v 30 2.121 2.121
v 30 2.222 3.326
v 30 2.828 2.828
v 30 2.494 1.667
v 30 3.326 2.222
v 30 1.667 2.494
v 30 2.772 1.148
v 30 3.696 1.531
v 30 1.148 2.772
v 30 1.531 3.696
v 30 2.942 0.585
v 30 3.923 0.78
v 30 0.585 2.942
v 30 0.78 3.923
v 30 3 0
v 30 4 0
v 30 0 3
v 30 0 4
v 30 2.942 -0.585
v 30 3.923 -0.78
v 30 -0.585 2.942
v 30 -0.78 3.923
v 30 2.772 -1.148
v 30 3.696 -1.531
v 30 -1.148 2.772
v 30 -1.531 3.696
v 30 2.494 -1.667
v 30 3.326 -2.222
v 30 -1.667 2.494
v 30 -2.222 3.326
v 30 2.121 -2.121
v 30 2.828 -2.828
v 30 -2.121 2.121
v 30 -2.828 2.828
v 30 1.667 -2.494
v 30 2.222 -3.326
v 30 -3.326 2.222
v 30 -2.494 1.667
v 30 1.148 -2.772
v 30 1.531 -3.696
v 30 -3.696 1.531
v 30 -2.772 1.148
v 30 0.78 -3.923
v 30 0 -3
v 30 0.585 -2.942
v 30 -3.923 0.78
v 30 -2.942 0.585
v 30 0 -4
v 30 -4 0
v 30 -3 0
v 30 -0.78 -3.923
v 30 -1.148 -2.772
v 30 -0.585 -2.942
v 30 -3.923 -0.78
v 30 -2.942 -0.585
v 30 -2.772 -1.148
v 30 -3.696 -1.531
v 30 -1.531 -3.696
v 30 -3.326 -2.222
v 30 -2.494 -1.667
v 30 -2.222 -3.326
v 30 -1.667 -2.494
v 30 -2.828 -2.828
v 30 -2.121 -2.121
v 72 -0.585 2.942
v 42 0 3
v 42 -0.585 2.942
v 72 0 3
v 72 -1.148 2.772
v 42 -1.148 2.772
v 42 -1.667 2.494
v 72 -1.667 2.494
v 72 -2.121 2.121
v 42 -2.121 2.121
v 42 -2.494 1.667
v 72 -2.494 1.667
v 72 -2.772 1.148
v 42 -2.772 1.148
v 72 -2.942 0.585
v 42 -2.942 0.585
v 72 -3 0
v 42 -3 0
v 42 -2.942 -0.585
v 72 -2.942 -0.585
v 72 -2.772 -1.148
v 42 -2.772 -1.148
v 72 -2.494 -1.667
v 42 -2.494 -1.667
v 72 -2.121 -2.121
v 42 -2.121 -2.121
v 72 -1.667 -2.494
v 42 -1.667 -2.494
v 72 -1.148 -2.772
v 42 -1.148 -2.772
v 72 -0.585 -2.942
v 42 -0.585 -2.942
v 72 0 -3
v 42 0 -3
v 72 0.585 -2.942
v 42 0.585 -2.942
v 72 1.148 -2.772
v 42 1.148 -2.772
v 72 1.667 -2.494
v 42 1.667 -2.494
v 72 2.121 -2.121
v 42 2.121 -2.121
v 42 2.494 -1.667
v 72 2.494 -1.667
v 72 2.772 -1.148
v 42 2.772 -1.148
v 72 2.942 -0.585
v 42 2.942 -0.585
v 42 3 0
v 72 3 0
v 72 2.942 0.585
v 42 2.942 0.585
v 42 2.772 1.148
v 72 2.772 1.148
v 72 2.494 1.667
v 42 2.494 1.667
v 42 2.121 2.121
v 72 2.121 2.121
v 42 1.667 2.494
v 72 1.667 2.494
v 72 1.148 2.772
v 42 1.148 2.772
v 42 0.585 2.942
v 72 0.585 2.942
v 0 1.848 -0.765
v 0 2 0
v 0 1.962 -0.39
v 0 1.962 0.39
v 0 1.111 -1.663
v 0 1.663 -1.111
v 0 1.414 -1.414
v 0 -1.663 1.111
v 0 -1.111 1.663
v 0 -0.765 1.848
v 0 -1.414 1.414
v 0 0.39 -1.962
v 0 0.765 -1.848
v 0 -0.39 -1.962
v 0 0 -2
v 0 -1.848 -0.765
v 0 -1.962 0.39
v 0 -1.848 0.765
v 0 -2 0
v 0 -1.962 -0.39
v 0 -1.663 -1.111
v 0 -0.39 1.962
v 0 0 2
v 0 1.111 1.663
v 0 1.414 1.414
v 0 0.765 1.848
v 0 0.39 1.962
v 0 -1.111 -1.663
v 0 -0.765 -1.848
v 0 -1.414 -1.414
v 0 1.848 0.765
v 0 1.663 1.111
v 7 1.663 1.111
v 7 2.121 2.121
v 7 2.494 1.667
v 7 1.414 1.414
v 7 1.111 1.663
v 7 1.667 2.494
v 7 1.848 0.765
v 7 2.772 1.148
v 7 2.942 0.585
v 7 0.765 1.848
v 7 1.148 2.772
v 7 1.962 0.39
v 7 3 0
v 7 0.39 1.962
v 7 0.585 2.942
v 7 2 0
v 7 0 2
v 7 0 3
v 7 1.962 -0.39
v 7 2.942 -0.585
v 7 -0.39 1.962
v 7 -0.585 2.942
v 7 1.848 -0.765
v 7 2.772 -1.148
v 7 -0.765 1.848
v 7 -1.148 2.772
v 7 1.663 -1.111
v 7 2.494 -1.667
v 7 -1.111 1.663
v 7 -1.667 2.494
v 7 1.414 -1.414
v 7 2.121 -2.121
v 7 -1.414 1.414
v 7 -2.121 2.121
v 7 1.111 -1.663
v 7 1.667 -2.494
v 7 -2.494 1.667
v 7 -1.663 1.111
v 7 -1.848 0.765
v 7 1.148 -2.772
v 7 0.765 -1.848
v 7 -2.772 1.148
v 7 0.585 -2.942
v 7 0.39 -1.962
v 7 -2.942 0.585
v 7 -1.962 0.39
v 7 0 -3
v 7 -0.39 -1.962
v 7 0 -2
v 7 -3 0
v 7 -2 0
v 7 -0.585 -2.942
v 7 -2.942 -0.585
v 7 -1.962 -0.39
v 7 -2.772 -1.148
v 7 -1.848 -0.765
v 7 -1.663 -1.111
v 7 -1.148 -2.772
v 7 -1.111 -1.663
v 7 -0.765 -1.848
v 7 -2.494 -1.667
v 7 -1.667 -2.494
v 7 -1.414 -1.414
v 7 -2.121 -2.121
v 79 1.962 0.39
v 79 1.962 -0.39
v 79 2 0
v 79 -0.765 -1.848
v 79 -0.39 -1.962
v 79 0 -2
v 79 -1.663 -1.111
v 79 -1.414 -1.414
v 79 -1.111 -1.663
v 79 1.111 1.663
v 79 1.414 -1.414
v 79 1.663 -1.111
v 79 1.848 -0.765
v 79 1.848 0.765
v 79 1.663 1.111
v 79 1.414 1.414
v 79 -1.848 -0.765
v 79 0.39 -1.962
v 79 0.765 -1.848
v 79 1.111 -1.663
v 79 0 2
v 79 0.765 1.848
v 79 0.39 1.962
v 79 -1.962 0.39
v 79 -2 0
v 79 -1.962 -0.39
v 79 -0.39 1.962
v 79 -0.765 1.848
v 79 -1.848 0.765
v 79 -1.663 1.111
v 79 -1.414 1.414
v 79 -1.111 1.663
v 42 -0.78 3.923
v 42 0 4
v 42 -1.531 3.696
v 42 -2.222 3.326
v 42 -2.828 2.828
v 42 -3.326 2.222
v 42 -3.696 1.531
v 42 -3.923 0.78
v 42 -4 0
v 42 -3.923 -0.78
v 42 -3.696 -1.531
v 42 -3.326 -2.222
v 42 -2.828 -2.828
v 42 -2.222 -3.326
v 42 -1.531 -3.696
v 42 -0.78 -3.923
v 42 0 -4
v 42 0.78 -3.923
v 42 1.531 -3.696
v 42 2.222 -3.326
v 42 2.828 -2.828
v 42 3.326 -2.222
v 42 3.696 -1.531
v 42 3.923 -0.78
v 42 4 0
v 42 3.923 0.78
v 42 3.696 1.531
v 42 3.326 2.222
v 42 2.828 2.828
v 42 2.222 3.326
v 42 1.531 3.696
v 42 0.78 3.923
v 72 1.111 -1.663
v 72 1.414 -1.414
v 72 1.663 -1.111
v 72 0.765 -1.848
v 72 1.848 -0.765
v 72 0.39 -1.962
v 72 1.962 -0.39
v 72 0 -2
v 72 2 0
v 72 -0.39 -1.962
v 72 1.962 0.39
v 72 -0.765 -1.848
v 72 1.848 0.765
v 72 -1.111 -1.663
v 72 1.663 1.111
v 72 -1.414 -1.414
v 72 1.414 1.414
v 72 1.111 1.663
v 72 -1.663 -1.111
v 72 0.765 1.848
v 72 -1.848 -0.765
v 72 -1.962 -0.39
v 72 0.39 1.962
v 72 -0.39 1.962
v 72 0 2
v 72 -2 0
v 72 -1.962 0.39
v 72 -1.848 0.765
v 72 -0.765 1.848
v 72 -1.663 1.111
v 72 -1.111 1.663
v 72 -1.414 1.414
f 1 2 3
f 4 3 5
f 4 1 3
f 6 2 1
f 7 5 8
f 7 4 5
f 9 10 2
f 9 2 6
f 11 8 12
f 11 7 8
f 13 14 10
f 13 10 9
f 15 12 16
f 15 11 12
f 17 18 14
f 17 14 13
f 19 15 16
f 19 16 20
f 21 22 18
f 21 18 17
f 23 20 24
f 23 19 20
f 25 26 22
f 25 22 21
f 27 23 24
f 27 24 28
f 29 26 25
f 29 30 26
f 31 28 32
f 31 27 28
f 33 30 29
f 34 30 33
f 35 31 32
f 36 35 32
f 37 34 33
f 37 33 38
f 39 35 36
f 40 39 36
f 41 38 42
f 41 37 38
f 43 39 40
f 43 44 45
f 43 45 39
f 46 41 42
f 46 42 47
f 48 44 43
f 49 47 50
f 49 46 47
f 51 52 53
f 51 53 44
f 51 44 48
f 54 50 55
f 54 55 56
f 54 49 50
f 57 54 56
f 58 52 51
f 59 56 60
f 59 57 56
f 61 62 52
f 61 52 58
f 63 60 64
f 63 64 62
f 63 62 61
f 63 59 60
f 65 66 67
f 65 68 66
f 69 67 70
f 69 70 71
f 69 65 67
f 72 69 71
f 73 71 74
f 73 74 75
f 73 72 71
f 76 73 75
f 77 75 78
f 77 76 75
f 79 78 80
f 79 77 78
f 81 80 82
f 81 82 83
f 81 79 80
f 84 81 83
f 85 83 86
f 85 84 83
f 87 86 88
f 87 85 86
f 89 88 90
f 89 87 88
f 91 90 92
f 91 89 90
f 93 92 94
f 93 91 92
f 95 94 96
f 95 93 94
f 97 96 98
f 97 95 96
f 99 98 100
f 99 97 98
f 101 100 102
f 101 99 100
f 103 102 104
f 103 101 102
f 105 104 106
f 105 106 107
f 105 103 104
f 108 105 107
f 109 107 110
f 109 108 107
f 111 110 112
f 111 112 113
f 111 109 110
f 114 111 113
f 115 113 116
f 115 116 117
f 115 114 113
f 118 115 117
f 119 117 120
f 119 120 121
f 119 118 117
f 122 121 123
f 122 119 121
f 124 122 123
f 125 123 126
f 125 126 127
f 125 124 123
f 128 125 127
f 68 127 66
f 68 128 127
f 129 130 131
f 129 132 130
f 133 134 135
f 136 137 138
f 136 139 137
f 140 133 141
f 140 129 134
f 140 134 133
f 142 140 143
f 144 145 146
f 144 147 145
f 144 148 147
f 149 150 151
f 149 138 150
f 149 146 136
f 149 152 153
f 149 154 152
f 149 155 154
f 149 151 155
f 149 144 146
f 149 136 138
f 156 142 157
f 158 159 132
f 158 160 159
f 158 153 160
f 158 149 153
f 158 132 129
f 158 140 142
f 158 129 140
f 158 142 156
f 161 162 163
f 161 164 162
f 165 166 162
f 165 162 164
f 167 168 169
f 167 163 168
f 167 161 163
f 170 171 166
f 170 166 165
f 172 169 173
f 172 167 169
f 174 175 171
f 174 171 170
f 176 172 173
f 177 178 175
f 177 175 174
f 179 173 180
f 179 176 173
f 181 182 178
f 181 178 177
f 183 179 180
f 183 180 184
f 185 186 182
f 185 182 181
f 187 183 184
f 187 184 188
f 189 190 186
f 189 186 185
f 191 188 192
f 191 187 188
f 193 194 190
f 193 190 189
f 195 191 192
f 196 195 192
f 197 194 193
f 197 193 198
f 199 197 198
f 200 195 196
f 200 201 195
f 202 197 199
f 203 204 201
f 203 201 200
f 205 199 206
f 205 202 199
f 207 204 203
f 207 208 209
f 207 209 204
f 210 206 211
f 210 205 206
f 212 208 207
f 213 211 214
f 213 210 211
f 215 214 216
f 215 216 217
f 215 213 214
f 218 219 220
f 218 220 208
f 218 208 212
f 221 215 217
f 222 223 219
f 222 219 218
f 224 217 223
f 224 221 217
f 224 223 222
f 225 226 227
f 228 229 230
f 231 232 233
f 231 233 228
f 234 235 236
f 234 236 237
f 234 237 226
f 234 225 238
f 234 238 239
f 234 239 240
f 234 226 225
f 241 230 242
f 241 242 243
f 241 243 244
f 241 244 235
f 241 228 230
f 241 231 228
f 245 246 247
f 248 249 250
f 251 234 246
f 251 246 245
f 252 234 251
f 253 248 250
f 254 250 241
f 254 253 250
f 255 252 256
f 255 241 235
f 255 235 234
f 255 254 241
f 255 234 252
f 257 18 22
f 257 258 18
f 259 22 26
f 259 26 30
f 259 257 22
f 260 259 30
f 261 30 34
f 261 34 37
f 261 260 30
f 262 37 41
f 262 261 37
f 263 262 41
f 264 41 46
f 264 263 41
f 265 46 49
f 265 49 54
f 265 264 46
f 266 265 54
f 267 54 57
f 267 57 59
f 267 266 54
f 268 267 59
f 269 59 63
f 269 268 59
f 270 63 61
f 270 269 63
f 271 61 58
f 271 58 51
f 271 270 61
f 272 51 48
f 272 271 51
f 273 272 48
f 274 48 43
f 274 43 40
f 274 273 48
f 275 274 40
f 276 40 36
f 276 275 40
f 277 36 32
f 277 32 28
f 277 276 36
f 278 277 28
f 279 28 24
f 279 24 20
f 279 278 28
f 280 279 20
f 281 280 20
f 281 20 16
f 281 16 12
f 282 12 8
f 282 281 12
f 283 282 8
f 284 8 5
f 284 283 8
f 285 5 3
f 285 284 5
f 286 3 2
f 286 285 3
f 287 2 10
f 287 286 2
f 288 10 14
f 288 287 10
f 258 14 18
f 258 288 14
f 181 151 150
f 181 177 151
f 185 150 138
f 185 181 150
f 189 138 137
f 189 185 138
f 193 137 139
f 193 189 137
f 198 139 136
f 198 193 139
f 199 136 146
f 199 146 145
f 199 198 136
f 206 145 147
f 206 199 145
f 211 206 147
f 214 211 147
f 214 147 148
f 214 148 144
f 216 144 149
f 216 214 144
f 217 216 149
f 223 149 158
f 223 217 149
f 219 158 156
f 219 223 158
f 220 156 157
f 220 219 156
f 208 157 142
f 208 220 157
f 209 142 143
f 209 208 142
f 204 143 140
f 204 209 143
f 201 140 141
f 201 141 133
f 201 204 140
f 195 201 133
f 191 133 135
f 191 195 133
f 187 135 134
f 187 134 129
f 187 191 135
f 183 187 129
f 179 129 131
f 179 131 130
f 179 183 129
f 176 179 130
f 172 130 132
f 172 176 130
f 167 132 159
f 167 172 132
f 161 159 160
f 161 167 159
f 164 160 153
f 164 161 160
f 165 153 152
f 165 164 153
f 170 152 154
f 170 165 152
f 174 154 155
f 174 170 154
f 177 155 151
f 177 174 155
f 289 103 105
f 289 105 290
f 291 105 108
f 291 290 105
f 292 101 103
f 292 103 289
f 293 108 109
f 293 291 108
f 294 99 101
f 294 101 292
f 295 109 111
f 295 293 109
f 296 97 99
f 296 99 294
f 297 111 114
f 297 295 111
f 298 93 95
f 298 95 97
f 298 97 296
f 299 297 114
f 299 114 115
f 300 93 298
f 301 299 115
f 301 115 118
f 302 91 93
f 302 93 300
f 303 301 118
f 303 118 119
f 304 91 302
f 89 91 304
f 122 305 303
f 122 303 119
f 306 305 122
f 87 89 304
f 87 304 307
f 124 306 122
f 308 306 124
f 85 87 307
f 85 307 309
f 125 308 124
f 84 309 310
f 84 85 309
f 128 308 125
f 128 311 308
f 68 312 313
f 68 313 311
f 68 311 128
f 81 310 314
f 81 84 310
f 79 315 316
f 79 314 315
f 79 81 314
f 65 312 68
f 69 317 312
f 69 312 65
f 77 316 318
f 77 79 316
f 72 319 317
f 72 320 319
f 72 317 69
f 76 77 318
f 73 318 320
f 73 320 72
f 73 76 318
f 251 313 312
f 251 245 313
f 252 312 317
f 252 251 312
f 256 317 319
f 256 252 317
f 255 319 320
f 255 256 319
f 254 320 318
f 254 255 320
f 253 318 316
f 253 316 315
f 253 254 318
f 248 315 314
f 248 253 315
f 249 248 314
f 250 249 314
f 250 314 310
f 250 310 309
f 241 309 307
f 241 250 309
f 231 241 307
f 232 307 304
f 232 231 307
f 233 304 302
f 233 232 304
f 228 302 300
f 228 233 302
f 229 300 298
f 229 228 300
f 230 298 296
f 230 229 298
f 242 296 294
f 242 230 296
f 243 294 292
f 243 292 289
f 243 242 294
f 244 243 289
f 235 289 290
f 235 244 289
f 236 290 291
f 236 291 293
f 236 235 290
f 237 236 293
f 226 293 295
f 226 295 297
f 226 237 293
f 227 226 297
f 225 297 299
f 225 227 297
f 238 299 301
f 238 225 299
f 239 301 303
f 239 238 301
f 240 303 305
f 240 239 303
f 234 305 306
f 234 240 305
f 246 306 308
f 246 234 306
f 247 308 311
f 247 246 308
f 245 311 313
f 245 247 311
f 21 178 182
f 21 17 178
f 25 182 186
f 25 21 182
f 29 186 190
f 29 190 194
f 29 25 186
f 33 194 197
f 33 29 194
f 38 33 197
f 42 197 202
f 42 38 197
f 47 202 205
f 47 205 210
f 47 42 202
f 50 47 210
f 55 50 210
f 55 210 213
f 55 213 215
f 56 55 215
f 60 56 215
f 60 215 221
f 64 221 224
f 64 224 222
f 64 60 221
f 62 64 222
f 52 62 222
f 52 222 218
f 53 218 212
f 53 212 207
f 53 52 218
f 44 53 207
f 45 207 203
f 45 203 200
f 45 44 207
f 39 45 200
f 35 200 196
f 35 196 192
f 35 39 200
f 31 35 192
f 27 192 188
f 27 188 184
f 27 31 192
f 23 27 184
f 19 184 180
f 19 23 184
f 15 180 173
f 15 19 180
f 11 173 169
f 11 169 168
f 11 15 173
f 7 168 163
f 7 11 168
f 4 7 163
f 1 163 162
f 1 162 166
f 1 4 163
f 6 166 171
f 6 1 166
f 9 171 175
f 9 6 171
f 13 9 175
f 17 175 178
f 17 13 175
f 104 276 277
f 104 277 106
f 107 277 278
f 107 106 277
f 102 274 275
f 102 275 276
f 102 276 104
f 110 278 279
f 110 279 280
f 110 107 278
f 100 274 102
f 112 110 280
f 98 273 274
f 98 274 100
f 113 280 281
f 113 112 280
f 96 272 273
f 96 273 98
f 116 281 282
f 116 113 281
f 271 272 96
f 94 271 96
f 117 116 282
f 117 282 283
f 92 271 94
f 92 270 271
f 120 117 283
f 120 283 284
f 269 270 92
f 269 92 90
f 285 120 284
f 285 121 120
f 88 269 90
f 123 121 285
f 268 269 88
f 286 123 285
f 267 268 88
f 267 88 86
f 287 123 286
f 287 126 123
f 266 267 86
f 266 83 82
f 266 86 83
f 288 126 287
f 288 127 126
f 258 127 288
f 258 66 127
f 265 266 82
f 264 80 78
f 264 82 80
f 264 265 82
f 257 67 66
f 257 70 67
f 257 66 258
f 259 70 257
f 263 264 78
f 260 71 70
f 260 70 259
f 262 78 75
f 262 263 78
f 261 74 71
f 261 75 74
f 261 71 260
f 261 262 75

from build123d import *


with BuildPart() as part:
    # Esquisse1 → Révolution1 (revolve)
    with BuildSketch(Plane.XY, mode=Mode.PRIVATE) as r_volution1_sk:
        Polygon((42, 3), (72, 3), (72, 2), (79, 2), (79, 0), (0, 0), (0, 2), (7, 2), (7, 3), (30, 3), (30, 4), (42, 4), align=None)
    revolve(r_volution1_sk.sketch.rotate(Axis((0, 0, 0), (1, 0, 0)), 90), axis=Axis((0, 0, 0), (1, 0, 0)))  # turned: the seam where the file's is


solid = part.part
